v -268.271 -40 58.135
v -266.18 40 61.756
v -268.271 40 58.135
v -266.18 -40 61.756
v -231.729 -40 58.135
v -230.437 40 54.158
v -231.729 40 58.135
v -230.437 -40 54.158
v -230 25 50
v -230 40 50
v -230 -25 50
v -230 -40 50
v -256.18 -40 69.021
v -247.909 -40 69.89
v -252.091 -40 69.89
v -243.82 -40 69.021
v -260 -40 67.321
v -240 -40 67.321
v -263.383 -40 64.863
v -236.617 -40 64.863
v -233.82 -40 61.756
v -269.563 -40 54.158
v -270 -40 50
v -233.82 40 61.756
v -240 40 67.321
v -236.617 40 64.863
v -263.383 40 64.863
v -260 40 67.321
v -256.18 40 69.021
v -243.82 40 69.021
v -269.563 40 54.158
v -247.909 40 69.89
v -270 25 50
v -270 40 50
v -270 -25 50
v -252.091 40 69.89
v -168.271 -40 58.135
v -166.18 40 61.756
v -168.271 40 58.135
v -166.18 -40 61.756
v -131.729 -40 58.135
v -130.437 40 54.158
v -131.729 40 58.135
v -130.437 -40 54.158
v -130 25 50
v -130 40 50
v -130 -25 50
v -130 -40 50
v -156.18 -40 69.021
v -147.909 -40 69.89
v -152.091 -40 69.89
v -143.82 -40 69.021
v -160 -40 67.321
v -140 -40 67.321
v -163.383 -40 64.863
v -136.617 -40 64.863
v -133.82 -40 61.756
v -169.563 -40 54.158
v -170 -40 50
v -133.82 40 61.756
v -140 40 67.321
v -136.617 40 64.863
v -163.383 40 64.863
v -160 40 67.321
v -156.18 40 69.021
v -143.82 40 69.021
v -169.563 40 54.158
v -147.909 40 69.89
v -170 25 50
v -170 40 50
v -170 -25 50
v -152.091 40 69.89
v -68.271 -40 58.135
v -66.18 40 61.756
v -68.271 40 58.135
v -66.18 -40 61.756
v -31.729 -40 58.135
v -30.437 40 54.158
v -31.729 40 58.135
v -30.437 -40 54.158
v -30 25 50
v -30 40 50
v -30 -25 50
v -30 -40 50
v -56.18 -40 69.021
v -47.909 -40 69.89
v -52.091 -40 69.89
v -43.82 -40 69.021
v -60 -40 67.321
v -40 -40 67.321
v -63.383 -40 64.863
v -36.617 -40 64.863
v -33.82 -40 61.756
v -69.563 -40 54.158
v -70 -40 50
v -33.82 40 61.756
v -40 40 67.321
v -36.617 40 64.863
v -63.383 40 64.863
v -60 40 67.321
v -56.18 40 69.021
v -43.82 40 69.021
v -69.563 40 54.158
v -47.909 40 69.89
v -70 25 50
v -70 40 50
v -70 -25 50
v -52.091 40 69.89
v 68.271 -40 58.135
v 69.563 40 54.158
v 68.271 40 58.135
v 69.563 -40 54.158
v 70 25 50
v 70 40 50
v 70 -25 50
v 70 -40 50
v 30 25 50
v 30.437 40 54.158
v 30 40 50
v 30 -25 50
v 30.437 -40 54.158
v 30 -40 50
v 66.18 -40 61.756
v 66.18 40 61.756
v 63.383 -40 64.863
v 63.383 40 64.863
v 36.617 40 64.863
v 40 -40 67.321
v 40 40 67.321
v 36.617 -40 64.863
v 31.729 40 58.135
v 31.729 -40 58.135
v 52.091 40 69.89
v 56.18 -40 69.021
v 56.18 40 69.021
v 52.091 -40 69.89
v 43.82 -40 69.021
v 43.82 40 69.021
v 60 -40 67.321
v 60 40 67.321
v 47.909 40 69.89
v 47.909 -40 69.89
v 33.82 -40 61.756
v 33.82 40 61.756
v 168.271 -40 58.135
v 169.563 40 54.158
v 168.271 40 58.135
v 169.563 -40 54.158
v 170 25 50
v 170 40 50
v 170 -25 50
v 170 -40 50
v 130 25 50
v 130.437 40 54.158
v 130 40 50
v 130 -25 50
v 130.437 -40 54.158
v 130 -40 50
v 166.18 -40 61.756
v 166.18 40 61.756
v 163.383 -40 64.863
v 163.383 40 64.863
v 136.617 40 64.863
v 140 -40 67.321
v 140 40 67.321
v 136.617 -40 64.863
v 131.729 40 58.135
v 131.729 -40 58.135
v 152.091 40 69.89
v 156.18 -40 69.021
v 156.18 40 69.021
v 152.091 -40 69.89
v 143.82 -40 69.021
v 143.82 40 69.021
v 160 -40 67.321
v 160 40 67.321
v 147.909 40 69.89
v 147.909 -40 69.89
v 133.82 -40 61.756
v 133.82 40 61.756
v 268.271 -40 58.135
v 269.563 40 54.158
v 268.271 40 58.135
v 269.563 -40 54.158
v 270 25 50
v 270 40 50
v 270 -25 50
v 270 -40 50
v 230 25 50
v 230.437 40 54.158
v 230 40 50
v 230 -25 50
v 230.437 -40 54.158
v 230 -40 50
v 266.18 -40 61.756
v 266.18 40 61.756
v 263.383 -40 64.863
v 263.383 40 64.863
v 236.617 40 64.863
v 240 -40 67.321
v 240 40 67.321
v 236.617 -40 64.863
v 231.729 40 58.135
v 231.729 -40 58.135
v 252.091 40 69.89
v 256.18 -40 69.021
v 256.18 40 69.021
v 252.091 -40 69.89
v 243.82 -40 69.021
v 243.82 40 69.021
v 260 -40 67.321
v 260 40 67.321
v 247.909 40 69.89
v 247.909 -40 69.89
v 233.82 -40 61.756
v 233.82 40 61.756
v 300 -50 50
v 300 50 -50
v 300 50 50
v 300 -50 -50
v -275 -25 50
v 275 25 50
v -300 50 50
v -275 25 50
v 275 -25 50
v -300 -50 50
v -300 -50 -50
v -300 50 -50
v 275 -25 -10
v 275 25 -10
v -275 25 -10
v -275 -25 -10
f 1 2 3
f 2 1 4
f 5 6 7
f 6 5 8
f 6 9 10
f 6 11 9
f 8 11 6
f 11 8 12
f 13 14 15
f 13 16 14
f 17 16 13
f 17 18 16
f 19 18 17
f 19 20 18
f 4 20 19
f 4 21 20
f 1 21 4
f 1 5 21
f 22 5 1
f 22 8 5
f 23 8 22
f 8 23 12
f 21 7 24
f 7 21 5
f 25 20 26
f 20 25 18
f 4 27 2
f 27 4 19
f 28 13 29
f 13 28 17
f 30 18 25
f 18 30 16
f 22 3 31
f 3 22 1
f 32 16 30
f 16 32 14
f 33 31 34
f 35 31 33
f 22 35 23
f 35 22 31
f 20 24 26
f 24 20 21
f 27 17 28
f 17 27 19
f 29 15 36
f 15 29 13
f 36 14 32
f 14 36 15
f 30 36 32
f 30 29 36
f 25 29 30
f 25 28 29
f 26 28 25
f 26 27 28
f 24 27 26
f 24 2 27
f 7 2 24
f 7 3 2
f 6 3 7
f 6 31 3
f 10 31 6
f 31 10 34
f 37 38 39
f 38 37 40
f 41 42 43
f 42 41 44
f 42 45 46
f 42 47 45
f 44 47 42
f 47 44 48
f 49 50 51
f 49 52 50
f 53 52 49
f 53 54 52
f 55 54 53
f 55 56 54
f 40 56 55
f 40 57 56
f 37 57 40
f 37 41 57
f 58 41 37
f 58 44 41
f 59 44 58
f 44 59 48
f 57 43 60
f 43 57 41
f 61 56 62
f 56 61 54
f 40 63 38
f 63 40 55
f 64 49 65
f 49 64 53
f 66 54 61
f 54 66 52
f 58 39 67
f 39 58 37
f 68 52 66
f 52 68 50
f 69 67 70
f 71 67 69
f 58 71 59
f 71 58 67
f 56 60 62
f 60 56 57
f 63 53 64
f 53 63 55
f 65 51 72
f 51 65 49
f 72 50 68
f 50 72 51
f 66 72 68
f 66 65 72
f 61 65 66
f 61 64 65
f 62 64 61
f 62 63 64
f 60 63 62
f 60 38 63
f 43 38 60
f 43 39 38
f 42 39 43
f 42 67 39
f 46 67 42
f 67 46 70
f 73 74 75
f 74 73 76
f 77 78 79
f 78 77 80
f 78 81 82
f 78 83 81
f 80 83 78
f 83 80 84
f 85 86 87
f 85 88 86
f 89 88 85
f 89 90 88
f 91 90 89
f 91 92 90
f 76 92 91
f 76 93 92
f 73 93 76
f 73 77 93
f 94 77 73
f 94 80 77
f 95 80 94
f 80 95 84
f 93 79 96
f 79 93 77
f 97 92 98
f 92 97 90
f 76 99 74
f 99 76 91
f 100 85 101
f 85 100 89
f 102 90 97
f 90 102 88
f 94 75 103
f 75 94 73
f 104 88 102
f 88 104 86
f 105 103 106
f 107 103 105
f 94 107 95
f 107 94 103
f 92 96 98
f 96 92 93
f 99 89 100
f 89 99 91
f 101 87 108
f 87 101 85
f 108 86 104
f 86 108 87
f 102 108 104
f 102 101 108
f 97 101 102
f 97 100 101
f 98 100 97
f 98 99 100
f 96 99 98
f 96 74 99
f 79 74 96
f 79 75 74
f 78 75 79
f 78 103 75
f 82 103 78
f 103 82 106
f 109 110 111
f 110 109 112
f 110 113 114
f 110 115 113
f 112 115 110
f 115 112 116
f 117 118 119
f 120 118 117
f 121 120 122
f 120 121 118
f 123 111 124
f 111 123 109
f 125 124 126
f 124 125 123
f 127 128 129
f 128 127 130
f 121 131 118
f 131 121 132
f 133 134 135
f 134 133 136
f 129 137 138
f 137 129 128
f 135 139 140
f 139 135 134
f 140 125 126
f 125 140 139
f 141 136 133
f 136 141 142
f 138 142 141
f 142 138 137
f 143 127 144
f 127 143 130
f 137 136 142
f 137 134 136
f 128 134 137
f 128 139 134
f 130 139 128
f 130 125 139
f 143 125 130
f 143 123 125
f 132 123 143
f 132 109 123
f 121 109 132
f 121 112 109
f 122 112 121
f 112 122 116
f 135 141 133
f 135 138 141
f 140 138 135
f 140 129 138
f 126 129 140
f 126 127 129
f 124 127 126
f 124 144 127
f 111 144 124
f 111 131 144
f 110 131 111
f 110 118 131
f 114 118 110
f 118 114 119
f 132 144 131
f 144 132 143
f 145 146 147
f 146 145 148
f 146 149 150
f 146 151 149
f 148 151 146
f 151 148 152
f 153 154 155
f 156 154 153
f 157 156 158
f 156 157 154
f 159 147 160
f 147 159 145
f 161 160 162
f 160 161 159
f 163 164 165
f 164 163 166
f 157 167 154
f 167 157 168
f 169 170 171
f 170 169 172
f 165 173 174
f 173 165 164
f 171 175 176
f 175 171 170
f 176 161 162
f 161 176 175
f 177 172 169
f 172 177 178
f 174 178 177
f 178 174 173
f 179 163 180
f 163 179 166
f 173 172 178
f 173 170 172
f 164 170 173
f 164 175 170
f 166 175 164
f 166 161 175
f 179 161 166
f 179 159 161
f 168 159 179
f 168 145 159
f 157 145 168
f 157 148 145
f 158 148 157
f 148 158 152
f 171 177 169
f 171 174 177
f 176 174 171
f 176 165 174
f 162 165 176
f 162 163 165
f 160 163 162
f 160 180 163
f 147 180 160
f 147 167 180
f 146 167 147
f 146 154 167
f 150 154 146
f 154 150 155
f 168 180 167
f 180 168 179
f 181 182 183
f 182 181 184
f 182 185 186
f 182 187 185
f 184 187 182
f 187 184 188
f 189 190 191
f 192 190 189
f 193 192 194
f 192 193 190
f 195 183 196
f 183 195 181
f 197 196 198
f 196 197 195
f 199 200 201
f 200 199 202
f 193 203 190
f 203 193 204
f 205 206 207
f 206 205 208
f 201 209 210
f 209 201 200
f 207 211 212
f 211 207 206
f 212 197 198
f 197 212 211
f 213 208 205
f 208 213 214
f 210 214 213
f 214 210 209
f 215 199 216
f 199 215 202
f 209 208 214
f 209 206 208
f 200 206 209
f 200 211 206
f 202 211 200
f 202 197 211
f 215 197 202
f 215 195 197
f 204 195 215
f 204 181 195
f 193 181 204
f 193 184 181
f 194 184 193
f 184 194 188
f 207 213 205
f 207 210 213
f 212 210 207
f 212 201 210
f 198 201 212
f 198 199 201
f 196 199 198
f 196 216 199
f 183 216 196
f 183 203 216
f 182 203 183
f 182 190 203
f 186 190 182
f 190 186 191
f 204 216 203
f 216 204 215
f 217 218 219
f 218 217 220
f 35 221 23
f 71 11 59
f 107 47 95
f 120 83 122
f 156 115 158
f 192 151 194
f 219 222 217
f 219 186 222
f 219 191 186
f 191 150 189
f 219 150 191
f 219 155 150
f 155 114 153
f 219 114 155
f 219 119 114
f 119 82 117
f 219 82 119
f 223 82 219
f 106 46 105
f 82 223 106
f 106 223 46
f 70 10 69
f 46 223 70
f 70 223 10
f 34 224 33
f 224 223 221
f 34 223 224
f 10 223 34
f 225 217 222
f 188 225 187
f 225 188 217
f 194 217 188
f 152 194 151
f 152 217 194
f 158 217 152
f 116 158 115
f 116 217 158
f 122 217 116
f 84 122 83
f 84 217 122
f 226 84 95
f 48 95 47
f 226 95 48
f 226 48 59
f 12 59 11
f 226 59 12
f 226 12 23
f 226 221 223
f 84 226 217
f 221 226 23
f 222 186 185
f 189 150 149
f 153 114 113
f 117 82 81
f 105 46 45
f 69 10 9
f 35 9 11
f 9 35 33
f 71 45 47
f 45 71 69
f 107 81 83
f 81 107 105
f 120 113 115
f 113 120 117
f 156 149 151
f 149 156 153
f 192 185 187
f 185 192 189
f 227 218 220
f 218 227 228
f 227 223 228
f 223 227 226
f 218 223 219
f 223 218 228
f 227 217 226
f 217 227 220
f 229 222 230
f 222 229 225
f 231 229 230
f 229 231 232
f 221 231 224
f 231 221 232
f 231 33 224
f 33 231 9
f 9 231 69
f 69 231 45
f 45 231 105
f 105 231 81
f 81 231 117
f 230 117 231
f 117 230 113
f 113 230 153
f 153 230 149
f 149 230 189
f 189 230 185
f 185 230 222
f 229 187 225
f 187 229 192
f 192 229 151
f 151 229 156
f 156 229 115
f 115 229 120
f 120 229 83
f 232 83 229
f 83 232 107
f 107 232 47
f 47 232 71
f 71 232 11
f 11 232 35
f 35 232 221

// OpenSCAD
// BuilderBot Track Mesh

module track() {
    // Track body
    difference() {
        // Main track body
        union() {
            // Rectangular track base
            cube([600, 100, 100], center=true);
            
            // Add some surface detail
            for (x = [-250:100:250]) {
                translate([x, 0, 50]) 
                    rotate([90, 0, 0]) 
                    cylinder(h=80, r=20, center=true, $fn=30);
            }
        }
        
        // Hollow out for weight reduction
        translate([0, 0, 20])
            cube([550, 50, 60], center=true);
    }
}

// Render and export
track();
